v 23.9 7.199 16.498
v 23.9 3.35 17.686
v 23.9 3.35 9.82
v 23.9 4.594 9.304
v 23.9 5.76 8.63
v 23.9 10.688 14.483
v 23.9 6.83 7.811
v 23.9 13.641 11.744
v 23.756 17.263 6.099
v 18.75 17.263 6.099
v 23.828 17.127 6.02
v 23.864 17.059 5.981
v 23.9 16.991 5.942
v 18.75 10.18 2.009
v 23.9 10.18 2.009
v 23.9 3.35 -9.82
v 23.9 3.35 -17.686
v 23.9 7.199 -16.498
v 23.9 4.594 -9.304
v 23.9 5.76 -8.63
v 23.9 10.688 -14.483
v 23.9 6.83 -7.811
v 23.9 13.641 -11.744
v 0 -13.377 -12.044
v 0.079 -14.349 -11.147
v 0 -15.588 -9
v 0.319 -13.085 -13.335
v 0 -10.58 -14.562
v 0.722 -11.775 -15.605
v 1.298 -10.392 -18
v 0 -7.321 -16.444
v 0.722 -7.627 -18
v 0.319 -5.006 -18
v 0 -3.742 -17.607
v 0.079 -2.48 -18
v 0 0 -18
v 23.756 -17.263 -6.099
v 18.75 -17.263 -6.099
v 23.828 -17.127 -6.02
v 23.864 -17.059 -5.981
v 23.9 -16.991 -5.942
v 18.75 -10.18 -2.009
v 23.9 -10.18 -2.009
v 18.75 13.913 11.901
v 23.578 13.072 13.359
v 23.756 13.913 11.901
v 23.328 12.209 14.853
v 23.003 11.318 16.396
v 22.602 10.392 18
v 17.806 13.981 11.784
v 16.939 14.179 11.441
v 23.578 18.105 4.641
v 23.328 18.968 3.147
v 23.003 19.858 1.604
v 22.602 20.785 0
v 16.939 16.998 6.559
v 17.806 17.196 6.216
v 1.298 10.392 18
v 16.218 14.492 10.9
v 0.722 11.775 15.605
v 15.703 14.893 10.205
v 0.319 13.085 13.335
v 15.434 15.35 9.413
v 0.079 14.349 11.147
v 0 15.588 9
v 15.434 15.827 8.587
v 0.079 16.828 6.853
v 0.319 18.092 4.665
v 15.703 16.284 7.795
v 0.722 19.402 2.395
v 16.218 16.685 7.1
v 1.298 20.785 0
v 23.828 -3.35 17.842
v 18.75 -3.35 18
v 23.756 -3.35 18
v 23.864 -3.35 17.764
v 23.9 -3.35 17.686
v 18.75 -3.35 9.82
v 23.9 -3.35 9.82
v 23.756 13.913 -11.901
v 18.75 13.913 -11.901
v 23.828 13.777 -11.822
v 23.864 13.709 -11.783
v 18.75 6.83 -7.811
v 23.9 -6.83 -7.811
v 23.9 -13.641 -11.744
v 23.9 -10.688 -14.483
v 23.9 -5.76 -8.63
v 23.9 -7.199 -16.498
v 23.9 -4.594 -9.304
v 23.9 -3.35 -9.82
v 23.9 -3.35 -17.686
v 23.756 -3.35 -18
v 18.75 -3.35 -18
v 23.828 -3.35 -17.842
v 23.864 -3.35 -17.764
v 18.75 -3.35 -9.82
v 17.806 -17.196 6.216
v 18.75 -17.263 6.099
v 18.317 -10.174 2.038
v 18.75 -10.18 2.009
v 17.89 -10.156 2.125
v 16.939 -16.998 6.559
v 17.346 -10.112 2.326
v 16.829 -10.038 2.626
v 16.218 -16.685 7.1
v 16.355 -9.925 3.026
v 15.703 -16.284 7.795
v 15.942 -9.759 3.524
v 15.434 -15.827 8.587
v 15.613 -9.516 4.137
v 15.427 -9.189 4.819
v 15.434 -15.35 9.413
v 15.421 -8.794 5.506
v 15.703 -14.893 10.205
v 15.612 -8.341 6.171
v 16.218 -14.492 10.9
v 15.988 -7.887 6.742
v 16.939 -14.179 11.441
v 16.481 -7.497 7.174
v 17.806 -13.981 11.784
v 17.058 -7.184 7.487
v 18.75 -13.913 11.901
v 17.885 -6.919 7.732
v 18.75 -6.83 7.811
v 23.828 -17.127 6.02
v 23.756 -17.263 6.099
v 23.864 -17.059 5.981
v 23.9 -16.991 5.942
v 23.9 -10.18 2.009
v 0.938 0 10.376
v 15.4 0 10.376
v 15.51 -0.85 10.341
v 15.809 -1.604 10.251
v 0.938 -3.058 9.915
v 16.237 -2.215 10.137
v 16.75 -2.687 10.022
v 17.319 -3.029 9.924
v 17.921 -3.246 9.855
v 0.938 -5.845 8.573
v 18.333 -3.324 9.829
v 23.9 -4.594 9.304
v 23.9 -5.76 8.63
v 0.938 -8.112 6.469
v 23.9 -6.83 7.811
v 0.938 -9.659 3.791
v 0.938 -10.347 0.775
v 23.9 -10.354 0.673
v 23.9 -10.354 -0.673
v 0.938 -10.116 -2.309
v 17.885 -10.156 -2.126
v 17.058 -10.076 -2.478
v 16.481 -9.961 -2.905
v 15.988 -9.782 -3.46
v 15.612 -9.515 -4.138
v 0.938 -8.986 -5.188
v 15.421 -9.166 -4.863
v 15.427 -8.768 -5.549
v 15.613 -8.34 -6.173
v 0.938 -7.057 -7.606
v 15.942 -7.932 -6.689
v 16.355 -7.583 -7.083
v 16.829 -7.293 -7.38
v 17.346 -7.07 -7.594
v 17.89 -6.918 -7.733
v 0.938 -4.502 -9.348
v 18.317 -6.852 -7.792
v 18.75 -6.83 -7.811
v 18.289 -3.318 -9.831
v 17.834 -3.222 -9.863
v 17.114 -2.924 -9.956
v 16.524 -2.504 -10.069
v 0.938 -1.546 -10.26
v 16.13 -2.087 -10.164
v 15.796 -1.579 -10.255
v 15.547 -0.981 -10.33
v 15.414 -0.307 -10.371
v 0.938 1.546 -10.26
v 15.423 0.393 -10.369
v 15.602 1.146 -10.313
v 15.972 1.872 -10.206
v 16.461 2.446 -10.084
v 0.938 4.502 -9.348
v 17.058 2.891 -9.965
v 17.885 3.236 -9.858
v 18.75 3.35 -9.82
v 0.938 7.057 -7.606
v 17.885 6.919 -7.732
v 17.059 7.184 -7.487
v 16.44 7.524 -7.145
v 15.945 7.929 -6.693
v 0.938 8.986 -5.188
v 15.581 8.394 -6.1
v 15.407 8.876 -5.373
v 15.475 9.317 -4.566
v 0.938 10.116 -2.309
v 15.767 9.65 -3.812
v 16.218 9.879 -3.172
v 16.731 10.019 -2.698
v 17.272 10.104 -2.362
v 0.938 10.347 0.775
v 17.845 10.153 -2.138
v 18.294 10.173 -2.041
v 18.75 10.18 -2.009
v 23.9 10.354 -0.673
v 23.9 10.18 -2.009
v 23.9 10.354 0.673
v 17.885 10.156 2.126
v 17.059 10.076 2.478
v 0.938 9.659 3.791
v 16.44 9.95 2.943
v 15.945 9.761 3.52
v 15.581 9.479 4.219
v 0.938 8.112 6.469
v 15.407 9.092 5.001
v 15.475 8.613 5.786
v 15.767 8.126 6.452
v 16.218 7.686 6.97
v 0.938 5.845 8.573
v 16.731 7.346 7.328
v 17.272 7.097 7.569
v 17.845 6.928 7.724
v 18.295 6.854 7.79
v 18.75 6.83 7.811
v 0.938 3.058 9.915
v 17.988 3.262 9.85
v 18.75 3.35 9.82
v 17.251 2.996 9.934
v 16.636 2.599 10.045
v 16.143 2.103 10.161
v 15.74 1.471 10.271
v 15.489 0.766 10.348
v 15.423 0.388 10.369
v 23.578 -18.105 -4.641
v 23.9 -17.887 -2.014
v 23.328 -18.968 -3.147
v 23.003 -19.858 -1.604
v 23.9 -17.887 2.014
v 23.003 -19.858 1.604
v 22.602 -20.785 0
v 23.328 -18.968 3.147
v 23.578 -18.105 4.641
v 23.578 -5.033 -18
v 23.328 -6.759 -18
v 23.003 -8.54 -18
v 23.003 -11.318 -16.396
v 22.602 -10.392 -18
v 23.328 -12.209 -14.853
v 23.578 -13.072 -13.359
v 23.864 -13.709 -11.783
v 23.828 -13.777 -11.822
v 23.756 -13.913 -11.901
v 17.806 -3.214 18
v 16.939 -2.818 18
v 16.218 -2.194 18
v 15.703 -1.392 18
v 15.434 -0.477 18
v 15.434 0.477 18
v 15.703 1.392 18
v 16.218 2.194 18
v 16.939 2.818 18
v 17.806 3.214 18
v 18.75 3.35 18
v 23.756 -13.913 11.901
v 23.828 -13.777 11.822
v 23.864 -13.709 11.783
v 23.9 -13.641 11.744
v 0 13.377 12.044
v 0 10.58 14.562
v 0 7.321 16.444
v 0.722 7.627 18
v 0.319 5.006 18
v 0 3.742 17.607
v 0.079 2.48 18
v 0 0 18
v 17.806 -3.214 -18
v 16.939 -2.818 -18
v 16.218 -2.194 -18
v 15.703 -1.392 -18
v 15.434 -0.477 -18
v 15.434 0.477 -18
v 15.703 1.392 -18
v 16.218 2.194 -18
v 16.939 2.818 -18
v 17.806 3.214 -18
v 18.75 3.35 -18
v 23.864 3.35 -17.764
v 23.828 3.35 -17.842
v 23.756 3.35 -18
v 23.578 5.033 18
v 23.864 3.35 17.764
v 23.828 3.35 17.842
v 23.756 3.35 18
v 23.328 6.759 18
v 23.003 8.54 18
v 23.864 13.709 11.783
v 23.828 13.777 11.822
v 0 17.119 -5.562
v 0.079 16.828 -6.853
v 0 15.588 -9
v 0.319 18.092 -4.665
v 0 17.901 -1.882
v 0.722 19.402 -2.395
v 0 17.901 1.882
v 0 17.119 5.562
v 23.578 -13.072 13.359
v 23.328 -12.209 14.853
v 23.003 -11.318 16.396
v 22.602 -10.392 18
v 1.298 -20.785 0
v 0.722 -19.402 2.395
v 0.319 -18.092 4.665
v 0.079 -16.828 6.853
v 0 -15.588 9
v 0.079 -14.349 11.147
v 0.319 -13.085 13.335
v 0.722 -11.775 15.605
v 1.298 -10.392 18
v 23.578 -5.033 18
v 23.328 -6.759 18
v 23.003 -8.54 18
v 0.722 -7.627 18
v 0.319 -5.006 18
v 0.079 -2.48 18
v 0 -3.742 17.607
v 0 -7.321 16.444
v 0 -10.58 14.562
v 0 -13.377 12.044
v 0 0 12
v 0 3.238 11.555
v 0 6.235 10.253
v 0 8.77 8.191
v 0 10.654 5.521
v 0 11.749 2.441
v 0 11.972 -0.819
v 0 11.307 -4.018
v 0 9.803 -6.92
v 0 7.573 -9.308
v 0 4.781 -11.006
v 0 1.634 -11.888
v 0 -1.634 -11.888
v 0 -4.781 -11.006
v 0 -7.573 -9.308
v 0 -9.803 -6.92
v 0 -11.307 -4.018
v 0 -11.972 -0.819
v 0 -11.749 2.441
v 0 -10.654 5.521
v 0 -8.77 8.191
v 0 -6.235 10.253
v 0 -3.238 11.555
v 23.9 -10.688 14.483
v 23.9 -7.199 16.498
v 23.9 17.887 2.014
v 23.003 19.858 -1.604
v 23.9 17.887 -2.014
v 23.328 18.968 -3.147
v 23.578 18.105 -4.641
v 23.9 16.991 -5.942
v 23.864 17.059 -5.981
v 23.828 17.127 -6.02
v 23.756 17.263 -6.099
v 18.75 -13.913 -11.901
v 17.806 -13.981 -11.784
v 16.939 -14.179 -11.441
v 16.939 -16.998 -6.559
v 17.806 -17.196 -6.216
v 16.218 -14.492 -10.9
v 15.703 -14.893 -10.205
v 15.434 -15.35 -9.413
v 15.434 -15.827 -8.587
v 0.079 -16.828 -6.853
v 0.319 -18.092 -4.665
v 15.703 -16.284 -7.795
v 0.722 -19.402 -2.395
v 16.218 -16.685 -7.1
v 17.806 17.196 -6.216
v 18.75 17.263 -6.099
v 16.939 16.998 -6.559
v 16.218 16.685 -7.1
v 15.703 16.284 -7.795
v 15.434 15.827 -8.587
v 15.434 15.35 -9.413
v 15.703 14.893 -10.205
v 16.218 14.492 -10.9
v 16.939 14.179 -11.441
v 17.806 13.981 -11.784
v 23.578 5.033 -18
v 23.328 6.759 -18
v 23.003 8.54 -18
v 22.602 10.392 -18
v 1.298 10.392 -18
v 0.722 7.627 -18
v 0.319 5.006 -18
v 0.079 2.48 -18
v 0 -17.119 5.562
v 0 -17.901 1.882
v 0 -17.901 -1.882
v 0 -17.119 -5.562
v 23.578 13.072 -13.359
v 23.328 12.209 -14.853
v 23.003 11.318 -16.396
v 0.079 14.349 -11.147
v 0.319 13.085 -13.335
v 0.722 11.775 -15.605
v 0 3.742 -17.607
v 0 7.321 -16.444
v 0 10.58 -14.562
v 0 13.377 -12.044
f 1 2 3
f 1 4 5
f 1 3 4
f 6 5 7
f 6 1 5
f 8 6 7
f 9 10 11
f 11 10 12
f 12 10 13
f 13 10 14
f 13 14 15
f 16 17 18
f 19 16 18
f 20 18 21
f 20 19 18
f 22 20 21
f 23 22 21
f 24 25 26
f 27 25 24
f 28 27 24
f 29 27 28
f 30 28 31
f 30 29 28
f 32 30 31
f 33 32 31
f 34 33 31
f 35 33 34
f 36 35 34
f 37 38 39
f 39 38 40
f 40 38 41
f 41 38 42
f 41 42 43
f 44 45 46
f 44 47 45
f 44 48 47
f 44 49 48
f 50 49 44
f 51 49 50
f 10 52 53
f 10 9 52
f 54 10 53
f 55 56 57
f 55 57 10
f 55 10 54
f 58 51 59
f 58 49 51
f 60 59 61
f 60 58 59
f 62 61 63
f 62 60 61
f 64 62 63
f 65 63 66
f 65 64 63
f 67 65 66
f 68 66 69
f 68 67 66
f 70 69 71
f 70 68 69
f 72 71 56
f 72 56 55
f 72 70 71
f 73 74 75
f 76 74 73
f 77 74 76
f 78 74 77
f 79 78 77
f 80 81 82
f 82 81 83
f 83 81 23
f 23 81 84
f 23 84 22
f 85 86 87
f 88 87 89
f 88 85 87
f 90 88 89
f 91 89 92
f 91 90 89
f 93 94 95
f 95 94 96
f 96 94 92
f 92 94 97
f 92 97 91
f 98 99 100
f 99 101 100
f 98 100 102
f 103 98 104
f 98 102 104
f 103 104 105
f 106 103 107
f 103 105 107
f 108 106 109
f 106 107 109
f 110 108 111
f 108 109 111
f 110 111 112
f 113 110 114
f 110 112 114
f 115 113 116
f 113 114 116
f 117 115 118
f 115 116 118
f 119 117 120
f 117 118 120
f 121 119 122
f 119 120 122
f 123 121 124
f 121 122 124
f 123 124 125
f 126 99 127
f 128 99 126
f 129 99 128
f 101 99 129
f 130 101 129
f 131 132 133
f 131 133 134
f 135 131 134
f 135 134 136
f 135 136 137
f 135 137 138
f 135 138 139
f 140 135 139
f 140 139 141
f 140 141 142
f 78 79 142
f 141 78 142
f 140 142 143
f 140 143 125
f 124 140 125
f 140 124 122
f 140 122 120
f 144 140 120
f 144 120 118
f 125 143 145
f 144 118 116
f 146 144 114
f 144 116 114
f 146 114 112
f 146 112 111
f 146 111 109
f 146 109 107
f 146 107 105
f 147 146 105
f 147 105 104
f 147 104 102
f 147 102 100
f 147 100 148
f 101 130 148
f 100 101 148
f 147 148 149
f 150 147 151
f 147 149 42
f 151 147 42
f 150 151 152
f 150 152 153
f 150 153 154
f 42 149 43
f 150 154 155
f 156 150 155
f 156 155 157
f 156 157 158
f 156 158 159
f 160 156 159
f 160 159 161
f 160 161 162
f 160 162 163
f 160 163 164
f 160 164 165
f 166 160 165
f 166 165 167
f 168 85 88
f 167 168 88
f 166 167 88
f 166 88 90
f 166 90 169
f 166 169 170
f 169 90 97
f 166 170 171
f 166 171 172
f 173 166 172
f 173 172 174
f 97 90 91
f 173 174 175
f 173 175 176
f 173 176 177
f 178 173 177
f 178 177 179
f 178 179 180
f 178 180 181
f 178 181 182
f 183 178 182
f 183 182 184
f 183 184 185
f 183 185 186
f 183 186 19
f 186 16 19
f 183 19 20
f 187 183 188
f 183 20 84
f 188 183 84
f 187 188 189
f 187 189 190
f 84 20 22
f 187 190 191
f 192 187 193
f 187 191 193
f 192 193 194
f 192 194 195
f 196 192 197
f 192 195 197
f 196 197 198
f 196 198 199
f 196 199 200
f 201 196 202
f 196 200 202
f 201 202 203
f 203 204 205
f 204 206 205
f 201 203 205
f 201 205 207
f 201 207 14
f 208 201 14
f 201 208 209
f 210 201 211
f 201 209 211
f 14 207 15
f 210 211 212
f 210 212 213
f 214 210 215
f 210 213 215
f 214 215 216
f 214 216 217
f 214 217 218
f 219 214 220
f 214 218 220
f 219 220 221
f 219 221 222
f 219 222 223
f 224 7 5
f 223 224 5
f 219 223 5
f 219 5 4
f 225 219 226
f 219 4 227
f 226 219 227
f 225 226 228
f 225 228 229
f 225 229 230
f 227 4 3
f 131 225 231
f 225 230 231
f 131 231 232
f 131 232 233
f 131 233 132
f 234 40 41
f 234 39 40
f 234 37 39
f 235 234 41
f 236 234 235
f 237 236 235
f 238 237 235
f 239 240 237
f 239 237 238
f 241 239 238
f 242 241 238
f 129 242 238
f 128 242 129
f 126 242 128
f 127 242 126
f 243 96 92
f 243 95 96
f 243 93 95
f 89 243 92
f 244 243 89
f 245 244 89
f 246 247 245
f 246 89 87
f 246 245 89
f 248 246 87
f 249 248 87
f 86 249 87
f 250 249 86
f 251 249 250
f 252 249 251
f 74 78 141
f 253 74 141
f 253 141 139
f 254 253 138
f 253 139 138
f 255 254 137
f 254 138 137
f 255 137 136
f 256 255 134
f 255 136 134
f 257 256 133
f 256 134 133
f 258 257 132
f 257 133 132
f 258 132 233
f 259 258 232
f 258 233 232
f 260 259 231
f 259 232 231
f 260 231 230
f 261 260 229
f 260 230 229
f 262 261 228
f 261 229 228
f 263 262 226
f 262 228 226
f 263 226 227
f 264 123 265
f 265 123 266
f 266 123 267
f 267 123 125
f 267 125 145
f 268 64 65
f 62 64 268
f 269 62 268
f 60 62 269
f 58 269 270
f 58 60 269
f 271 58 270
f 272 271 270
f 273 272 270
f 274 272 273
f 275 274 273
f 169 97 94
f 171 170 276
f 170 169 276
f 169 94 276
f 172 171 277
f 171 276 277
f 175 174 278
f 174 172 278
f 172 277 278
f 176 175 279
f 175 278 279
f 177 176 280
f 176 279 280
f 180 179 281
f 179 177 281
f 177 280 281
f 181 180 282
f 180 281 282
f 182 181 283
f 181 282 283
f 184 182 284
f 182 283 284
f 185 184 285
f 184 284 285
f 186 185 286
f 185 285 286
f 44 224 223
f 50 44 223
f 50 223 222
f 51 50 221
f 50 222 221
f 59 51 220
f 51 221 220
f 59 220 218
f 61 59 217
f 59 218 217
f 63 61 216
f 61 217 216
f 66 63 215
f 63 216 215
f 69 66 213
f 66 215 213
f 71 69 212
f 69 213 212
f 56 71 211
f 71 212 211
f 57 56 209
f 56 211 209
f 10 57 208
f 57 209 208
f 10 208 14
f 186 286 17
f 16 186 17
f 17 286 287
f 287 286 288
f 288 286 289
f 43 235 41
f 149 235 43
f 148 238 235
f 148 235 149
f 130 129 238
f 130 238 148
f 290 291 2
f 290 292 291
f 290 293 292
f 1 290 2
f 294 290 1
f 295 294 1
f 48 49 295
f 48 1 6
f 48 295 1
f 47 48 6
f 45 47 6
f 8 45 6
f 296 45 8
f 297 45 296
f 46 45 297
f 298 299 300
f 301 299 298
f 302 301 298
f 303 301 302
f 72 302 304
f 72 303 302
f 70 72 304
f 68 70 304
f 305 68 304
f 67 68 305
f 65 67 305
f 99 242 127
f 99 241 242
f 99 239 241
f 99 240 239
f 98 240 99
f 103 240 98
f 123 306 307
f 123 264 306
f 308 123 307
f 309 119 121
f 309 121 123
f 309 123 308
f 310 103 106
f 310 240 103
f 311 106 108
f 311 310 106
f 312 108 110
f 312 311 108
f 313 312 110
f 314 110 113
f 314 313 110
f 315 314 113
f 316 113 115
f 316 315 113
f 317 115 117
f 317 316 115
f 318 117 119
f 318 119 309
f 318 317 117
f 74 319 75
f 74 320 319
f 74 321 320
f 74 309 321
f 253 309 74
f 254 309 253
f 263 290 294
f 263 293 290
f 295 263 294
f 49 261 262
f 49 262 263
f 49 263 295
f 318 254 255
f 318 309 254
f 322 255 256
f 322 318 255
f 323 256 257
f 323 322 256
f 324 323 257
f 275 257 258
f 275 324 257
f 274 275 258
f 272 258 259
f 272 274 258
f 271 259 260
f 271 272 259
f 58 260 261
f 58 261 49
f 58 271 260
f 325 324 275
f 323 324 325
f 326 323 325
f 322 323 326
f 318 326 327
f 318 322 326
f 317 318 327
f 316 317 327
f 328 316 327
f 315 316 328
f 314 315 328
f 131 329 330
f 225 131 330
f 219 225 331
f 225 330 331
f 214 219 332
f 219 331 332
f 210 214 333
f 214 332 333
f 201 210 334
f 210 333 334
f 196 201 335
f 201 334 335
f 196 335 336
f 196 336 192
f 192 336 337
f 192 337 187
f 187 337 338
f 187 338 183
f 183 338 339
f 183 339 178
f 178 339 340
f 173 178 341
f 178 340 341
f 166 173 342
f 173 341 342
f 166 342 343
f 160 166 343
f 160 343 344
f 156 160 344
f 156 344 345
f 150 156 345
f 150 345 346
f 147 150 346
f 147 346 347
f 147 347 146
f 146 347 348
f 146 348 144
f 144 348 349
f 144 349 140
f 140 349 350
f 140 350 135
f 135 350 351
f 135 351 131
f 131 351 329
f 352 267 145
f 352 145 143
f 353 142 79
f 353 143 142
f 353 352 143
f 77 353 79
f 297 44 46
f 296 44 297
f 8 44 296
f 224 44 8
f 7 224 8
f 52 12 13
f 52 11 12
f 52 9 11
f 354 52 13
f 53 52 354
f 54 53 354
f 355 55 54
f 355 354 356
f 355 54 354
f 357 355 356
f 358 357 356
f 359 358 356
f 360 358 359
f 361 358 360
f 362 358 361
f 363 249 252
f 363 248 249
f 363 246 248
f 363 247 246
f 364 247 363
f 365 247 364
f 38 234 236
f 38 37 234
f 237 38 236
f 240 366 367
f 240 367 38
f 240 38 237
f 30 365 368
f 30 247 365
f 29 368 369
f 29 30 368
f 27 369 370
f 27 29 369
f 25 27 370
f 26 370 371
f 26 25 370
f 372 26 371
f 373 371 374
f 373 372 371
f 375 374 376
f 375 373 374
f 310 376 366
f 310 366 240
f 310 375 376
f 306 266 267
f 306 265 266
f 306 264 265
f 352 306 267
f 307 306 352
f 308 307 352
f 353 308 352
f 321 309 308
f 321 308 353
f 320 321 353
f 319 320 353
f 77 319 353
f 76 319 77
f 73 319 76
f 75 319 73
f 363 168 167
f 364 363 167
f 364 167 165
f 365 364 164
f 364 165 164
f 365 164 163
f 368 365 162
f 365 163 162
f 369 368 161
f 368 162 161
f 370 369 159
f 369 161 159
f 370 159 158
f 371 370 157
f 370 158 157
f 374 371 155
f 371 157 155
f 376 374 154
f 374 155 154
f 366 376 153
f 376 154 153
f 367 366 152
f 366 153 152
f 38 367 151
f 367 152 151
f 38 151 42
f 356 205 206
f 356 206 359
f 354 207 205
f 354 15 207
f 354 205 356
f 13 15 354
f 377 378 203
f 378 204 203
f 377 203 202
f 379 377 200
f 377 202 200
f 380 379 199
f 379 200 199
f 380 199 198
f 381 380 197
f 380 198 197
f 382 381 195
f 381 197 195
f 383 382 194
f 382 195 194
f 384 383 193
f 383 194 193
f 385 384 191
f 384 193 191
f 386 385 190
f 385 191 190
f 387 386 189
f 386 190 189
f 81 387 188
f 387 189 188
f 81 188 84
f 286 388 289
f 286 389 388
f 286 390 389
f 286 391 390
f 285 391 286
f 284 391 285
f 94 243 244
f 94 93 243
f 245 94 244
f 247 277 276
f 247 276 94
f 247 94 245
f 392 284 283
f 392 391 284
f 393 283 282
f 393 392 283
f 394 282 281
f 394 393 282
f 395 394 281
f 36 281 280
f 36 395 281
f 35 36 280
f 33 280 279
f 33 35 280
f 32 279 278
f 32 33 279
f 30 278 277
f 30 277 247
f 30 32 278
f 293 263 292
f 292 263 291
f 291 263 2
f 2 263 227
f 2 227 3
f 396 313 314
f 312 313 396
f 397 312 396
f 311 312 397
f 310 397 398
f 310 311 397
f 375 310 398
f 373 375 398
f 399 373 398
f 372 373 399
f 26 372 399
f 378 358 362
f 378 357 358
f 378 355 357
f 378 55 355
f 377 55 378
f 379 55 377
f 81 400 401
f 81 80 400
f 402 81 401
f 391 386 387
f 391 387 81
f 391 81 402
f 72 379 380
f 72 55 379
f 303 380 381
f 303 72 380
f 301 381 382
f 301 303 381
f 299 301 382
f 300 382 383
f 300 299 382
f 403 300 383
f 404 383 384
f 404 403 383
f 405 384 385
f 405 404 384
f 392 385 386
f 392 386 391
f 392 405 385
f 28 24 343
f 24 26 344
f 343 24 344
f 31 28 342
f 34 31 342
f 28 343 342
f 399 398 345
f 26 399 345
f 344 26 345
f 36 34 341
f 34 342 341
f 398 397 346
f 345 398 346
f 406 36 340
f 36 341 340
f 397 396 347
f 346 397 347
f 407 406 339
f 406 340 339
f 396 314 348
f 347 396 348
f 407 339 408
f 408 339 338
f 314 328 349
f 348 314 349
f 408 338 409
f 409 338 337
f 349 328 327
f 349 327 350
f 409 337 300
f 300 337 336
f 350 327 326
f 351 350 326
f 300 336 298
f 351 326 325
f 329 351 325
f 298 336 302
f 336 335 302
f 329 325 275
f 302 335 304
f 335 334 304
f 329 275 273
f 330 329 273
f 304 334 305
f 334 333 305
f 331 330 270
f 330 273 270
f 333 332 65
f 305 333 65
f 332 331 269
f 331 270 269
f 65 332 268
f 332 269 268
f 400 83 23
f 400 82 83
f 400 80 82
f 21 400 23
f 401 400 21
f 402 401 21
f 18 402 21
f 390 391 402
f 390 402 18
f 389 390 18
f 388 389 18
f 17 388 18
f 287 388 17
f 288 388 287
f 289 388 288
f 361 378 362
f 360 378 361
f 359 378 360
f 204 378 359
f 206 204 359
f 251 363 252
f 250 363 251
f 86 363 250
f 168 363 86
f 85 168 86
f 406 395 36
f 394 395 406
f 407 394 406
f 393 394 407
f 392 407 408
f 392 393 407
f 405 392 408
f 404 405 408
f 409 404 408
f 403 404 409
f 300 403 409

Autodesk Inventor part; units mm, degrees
ref_plane "YZ Plane" through (0, 0, 0) normal (1, 0, 0) x (0, 1, 0)
ref_plane "XZ Plane" through (0, 0, 0) normal (0, 1, 0) x (-1, 0, 0)
sketch "Sketch1" plane through (0, 0, 0) normal (1, 0, 0) x (0, 1, 0)
  line L0 (-10.3923, 18) -> (10.3923, 18)
  line L1 (10.3923, 18) -> (20.7846, 0)
  line L2 (20.7846, 0) -> (10.3923, -18)
  line L3 (10.3923, -18) -> (-10.3923, -18)
  line L4 (-10.3923, -18) -> (-20.7846, 0)
  line L5 (-20.7846, 0) -> (-10.3923, 18)
  point P0 (0, 0)
  point P1 (0, 0)
  dimension "d0" = 41.5692
extrude "Body" add sketch "Sketch1" along normal blind 23.9
sketch "Sketch2" plane through (0, 0, 0) normal (0, 0, 1) x (1, 0, 0)
  line L0 (0, 10.3923) -> (0, 20.7846) projected
  line L1 (0, 20.7846) -> (23.9, 20.7846) projected
  line L2 (23.9, 10.3923) -> (23.9, 20.7846) projected
  line L3 (-4.78, 0) -> (28.68, 0) projected
  line L4 (1.2985, 20.7846) -> (0, 18)
  line L5 (22.6015, 20.7846) -> (23.9, 18)
  dimension "d3" = 25
  dimension "d4" = 25
  dimension "d5" = 36
  dimension "d6" = 36
revolve "Chamfer1" cut sketch "Sketch2" angle 360 about axis through (-10, 0, 0) along (1, 0, 0)
sketch "Sketch3" plane through (0, 0, 0) normal (0, 0, 1) x (1, 0, 0)
  line L0 (23.9, 0) -> (23.9, 15.5885) projected
  line L1 (23.9, -15.5885) -> (23.9, 0) projected
  line L2 (0, 15.5885) -> (0, 0) projected
  line L3 (0, 0) -> (0, -15.5885) projected
  line L4 (-4.78, 0) -> (28.68, 0) projected
  arc A0 (18.75, 3.35) -> (18.75, -3.35) centre (18.75, 0) ccw
  line L5 (18.75, 3.35) -> (23.9, 3.35)
  line L6 (18.75, -3.35) -> (23.9, -3.35)
  line L7 (23.9, -15.5885) -> (23.9, 0) projected
  dimension "d8" = 15.4
  dimension "d9" = 6.7
extrude "Groove" cut sketch "Sketch3" along normal through all
pattern_circular "Grooves" count 6 over 360 about axis through (-10, 0, 0) along (1, 0, 0) of "Groove"
sketch "Sketch4" plane through (0, 0, 0) normal (-1, 0, 0) x (0, 0, 1)
  arc A0 (-9, -15.5885) -> (9, -15.5885) centre (0, 0) ccw projected
hole "Thread" at (0, 0, 0) direction (1, 0, 0) diameter 20.752 end through all thread size "M24x3" class "6H" standard "ANSI Metric M Profile"
chamfer "Chamfer2" distance 1.6238 angle 30 1 edges at (0, 0, -10.376) measured on face at (0, -15.3677, 0.4169)
ref_plane "Work Plane1" through (18.75, 0, 0) normal (0, -0.5, -0.866) x (0, -0.866, 0.5)
equation "\"d0\" = 1.1547 * SW"
equation "\"d1\" = KOH"
equation "\"d3\" = ANG1"
equation "\"d4\" = ANG2"
equation "\"d5\" = SW0"
equation "\"d6\" = SW01"
equation "\"d8\" = KOH1"
equation "\"d9\" = SNB"
equation "\"d11\" = KOH"
equation "\"d15\" = -0.5 * GD1 + 0.5 * NND"
equation "\"d35\" = -0.5 * GD1 + 0.5 * NND"
equation "\"ANG1\" = 25deg"
equation "\"ANG2\" = 25deg"
equation "\"NND\" = 24"
equation "\"KOH\" = 23.9"
equation "\"SW\" = 36"
equation "\"SNB\" = 6.7"
equation "\"KOH1\" = 15.4"
equation "\"SW01\" = SW"
equation "\"SW0\" = SW"
equation "\"d37\" = KOH1 - 0.288675 * NND + 0.288675 * GD1"
equation "\"GUL\" = 0.541266 * PTC"
equation "\"THREADDIA\" = 24"
equation "\"TOA\" = 30deg"
equation "\"PTC\" = 3"
equation "\"E0\" = 1.155 * SW"
equation "\"GAL\" = 0.541266 * PTC"
equation "\"GD1\" = 20.752405"
properties part number "ANSI B18.2.4.3M - M24 x 3" material "Steel, Mild"
